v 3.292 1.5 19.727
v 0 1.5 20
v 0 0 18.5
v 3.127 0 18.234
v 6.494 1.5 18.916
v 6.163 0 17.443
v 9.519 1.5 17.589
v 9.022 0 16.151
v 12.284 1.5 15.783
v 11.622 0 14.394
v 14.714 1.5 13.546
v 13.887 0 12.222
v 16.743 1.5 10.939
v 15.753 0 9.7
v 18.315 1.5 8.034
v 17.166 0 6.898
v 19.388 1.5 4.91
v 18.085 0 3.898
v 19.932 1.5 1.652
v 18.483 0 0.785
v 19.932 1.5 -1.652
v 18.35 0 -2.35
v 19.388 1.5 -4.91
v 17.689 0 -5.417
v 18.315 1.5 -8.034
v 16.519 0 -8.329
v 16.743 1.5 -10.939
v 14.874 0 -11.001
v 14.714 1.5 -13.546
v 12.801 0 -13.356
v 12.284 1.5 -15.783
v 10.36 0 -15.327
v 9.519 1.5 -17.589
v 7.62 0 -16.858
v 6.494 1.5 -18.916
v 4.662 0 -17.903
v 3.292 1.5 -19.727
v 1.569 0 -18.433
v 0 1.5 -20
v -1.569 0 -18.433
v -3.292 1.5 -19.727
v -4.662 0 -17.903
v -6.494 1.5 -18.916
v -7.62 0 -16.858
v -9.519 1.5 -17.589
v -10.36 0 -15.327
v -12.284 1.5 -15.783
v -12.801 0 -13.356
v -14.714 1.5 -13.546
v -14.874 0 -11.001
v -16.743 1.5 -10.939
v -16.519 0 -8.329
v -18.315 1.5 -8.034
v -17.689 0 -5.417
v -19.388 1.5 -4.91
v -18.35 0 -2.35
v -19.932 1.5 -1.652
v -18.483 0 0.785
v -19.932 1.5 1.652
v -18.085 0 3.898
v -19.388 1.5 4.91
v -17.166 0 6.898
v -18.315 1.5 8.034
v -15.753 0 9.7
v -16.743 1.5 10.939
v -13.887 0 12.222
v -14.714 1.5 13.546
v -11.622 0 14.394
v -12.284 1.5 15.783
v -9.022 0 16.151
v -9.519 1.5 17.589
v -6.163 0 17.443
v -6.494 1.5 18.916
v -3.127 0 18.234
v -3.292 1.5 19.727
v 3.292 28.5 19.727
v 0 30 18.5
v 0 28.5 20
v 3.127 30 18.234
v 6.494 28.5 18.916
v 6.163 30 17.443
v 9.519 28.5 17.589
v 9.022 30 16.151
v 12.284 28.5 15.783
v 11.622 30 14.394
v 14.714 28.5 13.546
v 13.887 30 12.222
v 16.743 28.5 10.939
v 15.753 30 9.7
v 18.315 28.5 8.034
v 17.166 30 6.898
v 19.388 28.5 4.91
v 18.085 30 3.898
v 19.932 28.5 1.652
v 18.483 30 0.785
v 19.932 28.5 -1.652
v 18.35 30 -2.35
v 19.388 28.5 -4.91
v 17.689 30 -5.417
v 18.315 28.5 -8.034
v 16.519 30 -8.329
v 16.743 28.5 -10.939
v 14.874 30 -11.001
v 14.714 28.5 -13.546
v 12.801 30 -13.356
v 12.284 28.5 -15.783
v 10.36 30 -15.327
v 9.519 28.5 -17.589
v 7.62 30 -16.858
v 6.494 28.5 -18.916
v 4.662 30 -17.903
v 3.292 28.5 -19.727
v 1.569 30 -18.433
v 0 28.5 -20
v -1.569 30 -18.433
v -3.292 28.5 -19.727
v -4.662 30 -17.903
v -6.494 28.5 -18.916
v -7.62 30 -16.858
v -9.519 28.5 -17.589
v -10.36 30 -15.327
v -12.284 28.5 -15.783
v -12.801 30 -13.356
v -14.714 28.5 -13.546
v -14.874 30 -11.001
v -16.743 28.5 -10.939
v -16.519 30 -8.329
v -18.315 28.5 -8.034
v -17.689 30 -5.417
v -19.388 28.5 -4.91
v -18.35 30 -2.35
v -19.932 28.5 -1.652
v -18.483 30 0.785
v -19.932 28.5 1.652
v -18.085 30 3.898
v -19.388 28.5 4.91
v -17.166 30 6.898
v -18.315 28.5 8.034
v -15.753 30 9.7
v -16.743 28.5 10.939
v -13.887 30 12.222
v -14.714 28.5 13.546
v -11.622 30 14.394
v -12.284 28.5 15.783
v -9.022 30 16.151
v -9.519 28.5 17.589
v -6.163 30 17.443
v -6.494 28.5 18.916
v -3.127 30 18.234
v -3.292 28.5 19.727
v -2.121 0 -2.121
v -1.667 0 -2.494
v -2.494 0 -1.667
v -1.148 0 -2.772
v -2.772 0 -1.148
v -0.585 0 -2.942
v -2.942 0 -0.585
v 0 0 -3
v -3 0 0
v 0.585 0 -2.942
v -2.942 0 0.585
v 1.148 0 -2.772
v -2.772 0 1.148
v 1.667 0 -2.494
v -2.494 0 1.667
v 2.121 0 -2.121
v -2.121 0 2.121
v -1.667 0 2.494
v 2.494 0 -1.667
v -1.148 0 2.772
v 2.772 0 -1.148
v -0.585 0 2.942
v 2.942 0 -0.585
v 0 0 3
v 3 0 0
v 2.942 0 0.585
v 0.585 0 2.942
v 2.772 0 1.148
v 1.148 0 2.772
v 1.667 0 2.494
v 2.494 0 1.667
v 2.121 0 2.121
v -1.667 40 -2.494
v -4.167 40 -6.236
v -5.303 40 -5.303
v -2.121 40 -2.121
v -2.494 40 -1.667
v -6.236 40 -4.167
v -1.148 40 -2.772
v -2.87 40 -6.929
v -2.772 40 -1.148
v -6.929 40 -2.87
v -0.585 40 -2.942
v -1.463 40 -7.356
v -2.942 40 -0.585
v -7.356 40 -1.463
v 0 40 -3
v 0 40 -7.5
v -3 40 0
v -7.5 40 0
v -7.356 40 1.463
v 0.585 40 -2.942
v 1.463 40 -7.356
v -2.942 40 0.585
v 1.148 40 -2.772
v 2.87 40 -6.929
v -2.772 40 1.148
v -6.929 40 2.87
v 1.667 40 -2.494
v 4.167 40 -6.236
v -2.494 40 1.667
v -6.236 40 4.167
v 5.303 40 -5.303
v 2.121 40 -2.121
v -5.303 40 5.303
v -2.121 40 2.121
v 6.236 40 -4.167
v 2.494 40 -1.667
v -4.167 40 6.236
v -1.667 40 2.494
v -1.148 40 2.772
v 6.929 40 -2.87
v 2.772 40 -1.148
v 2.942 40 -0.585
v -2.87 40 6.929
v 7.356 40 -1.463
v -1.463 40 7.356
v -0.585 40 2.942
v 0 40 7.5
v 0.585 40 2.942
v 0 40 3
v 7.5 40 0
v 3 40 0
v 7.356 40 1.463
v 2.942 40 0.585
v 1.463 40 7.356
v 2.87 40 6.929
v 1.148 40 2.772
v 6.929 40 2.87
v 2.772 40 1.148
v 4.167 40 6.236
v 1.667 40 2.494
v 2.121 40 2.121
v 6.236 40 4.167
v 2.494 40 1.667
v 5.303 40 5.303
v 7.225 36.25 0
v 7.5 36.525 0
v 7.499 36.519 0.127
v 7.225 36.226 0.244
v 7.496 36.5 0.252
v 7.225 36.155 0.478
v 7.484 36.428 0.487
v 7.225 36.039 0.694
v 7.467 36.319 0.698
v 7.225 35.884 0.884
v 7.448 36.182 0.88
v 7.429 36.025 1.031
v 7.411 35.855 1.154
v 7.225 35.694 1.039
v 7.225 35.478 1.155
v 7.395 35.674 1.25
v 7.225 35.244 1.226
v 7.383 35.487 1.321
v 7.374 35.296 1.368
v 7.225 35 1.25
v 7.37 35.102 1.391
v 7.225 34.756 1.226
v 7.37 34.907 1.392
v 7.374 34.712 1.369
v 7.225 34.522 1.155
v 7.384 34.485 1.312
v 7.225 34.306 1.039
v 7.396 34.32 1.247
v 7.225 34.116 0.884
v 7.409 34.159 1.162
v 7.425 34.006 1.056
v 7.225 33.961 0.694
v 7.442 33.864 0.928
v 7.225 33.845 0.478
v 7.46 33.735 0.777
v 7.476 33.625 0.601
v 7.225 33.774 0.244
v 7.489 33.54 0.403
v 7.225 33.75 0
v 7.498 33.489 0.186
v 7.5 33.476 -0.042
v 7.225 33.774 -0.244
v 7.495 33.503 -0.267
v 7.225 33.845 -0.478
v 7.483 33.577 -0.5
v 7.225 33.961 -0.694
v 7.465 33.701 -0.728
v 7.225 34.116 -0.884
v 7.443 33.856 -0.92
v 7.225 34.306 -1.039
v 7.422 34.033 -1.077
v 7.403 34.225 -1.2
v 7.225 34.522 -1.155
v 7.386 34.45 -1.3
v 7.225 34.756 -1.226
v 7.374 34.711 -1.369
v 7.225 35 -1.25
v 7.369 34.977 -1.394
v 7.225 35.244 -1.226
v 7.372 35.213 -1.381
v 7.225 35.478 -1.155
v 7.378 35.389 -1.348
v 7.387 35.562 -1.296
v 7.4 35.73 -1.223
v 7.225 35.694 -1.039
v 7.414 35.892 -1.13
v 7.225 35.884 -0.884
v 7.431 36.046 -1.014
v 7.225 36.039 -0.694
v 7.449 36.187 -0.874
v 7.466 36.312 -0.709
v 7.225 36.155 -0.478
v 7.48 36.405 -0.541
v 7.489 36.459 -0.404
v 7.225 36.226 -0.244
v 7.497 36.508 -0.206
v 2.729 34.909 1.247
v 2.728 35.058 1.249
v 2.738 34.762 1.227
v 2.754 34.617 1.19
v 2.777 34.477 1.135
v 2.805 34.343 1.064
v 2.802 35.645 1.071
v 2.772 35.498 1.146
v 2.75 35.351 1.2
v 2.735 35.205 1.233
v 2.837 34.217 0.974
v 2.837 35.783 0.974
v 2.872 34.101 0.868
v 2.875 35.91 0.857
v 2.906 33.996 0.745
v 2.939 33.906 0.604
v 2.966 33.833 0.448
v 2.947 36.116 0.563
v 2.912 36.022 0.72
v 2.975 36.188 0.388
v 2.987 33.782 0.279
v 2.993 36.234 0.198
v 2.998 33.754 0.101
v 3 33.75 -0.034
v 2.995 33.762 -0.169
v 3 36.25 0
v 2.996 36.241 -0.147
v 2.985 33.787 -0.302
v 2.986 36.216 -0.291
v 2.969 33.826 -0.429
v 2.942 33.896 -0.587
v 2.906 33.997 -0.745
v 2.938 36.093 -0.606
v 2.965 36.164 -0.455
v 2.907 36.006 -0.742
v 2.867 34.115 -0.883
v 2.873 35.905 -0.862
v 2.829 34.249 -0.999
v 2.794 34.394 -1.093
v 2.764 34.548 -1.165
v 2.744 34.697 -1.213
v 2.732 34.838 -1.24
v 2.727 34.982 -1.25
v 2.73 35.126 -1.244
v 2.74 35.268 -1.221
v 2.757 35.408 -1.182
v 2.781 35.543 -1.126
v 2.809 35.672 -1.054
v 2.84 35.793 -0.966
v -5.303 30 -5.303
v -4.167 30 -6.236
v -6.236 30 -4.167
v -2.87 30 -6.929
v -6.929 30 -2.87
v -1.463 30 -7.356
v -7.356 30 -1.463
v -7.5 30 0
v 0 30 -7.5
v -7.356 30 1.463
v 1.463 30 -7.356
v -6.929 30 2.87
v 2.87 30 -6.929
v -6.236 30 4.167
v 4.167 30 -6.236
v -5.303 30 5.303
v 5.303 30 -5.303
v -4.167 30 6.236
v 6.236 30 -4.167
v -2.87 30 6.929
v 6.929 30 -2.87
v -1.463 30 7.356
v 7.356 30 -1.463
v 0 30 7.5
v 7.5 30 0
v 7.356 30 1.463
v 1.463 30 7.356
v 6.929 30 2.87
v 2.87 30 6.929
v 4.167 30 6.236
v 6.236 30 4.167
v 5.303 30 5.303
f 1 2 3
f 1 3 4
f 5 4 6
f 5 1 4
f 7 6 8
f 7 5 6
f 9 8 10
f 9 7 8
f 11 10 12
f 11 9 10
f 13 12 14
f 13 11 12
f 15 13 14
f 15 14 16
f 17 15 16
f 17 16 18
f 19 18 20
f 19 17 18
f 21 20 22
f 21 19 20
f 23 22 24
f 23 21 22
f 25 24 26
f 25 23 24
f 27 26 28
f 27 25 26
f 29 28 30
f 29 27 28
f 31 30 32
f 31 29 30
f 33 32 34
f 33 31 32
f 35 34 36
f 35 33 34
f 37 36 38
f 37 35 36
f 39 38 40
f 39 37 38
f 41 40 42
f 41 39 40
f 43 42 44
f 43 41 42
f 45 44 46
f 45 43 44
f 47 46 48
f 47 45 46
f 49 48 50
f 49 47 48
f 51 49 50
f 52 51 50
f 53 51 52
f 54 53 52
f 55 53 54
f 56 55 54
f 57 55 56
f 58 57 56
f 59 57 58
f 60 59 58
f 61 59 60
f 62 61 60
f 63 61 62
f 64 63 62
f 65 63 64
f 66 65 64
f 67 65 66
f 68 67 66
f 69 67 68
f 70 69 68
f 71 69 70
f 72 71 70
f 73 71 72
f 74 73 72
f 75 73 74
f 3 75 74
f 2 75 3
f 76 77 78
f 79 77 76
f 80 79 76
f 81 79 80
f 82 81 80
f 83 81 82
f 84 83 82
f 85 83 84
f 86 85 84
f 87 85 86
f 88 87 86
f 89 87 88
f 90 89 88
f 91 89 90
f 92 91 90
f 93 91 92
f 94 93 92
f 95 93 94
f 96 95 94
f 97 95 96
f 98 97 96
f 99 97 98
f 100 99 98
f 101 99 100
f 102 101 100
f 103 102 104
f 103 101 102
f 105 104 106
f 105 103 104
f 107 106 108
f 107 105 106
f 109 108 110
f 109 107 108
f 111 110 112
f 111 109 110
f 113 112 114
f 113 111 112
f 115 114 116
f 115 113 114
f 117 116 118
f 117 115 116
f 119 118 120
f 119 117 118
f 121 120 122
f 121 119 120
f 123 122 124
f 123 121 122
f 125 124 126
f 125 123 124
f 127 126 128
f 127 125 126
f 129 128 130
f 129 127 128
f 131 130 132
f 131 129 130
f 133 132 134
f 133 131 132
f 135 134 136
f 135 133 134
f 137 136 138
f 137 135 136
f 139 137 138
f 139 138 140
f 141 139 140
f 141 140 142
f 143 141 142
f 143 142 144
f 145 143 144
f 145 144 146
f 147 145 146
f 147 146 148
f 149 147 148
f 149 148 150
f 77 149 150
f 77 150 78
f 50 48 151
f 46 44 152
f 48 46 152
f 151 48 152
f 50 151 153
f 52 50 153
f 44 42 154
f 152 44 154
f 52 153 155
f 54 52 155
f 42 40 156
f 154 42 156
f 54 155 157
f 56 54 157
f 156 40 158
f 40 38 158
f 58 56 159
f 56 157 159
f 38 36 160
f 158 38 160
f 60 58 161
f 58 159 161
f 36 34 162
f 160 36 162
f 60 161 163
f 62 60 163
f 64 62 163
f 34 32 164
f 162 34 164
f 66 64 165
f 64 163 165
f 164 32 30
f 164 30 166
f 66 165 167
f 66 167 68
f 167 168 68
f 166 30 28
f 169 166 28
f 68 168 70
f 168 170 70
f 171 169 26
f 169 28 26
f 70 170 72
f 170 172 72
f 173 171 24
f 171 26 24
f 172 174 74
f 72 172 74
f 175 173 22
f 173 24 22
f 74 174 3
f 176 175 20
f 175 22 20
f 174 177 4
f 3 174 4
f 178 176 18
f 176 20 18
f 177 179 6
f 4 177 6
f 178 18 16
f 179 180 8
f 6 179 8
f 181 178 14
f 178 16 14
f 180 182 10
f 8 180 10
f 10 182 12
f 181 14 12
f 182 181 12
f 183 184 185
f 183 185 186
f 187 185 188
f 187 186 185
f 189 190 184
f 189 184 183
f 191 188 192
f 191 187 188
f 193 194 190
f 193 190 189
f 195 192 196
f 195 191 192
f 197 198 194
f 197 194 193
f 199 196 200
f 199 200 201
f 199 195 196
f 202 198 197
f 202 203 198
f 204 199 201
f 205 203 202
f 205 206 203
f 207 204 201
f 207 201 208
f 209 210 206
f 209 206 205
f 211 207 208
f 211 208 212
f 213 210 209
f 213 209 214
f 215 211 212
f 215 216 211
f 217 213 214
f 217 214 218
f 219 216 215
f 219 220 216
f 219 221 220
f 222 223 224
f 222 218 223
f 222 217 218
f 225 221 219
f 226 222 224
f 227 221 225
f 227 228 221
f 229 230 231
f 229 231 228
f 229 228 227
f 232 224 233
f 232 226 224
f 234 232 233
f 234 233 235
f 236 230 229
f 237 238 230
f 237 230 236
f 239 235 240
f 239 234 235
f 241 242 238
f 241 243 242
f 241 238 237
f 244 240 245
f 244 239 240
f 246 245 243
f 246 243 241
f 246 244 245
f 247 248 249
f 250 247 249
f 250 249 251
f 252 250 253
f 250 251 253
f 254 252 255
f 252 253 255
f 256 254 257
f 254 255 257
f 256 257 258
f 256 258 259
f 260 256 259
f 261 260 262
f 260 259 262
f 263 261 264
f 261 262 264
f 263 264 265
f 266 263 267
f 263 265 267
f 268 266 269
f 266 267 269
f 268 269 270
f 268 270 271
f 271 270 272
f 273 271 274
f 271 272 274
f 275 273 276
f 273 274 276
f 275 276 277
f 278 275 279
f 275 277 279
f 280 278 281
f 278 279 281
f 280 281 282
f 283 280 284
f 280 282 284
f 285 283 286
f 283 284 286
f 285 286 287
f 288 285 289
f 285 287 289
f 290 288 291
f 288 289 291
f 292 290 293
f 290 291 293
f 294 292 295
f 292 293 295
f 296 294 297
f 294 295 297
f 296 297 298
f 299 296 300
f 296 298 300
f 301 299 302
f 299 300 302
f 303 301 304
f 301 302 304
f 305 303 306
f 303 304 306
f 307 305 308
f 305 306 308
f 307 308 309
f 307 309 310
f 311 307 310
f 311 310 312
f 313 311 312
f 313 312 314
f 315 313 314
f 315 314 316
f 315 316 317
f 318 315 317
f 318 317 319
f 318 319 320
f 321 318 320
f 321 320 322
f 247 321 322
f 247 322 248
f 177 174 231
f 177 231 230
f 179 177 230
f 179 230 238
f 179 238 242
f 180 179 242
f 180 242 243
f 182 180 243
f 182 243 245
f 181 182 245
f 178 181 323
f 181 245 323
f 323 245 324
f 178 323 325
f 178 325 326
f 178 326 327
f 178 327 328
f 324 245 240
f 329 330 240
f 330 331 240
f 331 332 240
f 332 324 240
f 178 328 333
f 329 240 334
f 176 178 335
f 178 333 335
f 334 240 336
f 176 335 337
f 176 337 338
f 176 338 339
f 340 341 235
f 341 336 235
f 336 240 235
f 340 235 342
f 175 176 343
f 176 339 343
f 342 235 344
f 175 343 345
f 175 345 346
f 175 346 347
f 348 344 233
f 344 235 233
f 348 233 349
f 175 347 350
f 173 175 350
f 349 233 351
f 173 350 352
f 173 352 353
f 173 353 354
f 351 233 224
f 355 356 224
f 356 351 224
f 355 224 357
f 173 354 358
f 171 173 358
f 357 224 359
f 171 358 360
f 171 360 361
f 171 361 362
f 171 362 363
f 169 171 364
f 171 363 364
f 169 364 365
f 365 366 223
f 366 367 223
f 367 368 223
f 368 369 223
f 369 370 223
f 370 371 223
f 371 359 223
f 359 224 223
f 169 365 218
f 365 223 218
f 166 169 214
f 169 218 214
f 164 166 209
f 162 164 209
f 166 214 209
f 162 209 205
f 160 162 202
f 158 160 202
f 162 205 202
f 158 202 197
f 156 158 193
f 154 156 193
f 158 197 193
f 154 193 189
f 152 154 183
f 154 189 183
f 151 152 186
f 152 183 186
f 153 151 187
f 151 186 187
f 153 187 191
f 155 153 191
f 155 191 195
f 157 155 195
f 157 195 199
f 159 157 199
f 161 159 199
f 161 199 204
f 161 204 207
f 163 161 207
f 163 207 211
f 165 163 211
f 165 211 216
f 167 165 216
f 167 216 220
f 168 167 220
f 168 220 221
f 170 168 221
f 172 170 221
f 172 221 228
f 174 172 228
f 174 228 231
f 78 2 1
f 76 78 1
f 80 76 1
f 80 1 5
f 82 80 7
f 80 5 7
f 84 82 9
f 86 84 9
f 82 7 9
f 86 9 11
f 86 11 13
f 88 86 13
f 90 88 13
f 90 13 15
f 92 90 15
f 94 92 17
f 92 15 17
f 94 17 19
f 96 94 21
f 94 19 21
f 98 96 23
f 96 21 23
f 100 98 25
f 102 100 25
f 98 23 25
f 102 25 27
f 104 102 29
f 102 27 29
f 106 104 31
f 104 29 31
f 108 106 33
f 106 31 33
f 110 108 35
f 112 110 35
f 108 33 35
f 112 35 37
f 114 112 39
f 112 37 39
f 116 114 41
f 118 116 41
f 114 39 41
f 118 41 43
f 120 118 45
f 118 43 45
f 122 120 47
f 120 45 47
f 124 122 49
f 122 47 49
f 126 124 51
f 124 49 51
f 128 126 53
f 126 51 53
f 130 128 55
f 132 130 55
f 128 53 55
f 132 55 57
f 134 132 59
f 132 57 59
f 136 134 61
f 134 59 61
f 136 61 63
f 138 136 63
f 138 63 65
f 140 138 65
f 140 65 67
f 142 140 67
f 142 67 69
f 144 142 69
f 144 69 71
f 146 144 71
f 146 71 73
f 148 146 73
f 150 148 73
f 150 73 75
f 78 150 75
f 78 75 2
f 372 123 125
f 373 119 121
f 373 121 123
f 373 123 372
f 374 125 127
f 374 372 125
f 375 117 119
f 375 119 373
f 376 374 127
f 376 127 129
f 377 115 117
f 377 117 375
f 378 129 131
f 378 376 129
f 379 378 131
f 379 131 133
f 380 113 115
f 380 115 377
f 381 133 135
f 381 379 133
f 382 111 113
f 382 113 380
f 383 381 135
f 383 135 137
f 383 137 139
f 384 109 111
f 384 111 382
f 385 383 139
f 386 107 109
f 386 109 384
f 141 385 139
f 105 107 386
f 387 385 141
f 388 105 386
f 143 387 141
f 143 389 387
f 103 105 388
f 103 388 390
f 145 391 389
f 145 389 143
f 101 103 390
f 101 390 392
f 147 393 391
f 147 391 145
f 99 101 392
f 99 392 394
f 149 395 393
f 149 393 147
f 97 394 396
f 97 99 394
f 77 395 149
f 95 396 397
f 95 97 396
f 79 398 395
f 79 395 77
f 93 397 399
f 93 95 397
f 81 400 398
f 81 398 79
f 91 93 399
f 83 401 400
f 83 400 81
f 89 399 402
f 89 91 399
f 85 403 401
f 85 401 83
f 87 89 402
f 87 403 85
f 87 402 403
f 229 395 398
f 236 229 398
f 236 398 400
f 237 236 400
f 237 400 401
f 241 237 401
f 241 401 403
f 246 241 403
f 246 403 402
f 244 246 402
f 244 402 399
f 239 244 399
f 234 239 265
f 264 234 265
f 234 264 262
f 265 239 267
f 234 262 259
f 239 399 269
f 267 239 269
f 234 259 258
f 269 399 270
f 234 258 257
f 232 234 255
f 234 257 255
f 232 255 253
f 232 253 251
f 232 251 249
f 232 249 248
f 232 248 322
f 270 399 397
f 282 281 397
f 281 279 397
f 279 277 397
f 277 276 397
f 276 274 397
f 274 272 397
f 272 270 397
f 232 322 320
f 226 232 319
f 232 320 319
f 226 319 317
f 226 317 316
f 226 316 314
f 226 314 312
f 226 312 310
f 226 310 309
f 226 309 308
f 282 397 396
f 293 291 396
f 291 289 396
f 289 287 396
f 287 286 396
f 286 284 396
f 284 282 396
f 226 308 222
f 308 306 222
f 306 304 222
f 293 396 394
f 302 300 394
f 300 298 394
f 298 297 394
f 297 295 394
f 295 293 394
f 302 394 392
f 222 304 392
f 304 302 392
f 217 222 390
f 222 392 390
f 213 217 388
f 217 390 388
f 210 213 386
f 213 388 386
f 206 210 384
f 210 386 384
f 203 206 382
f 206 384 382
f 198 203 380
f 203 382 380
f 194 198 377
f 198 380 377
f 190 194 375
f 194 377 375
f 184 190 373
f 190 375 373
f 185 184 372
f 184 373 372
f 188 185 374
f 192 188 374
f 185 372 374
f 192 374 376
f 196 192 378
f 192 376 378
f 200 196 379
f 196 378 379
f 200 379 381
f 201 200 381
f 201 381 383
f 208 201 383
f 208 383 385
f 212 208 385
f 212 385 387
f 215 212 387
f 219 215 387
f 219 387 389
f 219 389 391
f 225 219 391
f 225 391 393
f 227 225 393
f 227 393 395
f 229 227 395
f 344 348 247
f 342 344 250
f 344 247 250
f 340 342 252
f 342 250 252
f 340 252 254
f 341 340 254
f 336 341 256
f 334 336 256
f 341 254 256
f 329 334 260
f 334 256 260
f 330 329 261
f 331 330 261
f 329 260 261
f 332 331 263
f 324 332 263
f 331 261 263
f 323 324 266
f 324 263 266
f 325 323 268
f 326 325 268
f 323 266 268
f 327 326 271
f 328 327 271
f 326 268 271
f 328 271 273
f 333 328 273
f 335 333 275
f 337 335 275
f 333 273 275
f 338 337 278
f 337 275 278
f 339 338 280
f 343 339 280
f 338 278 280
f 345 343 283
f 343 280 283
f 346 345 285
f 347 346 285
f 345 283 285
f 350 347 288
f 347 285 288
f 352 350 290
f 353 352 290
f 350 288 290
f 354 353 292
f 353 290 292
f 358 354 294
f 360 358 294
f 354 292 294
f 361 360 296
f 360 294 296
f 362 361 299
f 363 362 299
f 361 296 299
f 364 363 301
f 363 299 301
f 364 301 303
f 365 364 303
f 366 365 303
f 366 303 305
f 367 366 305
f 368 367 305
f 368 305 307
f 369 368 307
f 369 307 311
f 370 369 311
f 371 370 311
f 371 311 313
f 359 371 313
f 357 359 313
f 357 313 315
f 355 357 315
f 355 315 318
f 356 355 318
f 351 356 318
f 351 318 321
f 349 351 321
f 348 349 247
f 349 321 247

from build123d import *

# Parameters (mm, degrees)
SKETCH2_R           = 20
BOSS_EXTRUDE1_DEPTH = 30
SKETCH6_R           = 7.5
BOSS_EXTRUDE3_DEPTH = 40
SKETCH7_R           = 3
CUT_EXTRUDE1_DEPTH  = 49.989794856
CHAMFER1_SIZE       = 1.5


# Read off the part's stored shape, not the designer's step: M3 Tapped Hole1
with BuildPart() as part:
    # Sketch2 → Boss-Extrude1 (new body)
    with BuildSketch(Plane(origin=(0, 0, 0), x_dir=(1, 0, 0), z_dir=(0, 1, 0))):
        with Locations(Location((0, 0, 0), (0, 0, 270))):
            Circle(SKETCH2_R)
    extrude(amount=BOSS_EXTRUDE1_DEPTH)

    # Sketch6 → Boss-Extrude3 (add)
    with BuildSketch(Plane(origin=(0, 0, 0), x_dir=(1, 0, 0), z_dir=(0, 1, 0))):
        with Locations(Location((0, 0, 0), (0, 0, 270))):
            Circle(SKETCH6_R)
    extrude(amount=BOSS_EXTRUDE3_DEPTH)

    # Sketch7 → Cut-Extrude1 (cut, through all)
    with BuildSketch(Plane(origin=(0, 40, 0), x_dir=(1, 0, 0), z_dir=(0, 1, 0))):
        with Locations(Location((0, 0, 0), (0, 0, 270))):
            Circle(SKETCH7_R)
    extrude(amount=-CUT_EXTRUDE1_DEPTH, mode=Mode.SUBTRACT)

    # M3 Tapped Hole1 outline → M3 Tapped Hole1 (revolve, cut)
    with BuildSketch(Plane(origin=(0, 35, 0), x_dir=(0, 1, 0), z_dir=(0, 0, -1))):
        Polygon((1.525048793, 7.500048793), (0, 7.500048793), (0, 2.72705461), (1.25, 2.72705461), (1.25, 7.225), align=None)
    revolve(axis=Axis((0, 35, 0), (1, 0, 0)), mode=Mode.SUBTRACT)

    # Chamfer1
    chamfer1_edges = [part.edges().sort_by_distance(p)[0] for p in [
        (0, 0, -20),
        (0, 30, -20),
    ]]
    chamfer(chamfer1_edges, length=CHAMFER1_SIZE)


solid = part.part
